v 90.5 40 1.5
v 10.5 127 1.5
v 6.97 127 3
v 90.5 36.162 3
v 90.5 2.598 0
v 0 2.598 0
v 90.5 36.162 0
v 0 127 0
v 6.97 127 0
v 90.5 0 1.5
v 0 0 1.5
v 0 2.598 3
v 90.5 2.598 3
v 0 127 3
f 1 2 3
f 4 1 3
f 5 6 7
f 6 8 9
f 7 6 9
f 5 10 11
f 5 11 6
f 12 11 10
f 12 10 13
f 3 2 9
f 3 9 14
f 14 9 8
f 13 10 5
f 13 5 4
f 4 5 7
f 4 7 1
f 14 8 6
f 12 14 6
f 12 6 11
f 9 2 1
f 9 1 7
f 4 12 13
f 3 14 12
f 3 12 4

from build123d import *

# Parameters (mm, degrees)
BOSS_EXTRUDE1_DEPTH = 3
CHAMFER7_SIZE       = 1.5
CHAMFER7_SIZE_2     = 2.598076211


with BuildPart() as part:
    # Sketch1 → Boss-Extrude1 (new body)
    with BuildSketch(Plane.XY):
        Polygon((90.5, 0), (90.5, 40), (10.5, 127), (0, 127), (0, 0), align=None)
    extrude(amount=BOSS_EXTRUDE1_DEPTH)

    # Chamfer7
    # the kernel refuses this chamfer: 2.598076211, 1.5 mm, written as the material it takes off along each edge
    with BuildSketch(Plane(origin=(-6.721445956, 0, 3), x_dir=(0, -0.0578938624026714, -0.9983227437537926), z_dir=(1, 0, 0))) as chamfer7_piece_1:
        Polygon((CHAMFER7_SIZE * 0.998322743754, CHAMFER7_SIZE * 0.0578938624027), (-CHAMFER7_SIZE_2 * 0.0578938624105, CHAMFER7_SIZE_2 * 0.99832274389), (0, 0), align=None)
    extrude(amount=103.942891912, mode=Mode.SUBTRACT)
    with BuildSketch(Plane(origin=(-6.721445956, 0, 0), x_dir=(0, -0.0578938624026714, 0.9983227437537926), z_dir=(1, 0, 0))) as chamfer7_piece_2:
        Polygon((CHAMFER7_SIZE * 0.998322743754, -CHAMFER7_SIZE * 0.0578938624027), (-CHAMFER7_SIZE_2 * 0.0578938624105, -CHAMFER7_SIZE_2 * 0.99832274389), (0, 0), align=None)
    extrude(amount=103.942891912, mode=Mode.SUBTRACT)
    with BuildSketch(Plane(origin=(95.04956673, 35.052346181, 3), x_dir=(0.042615650155104184, 0.03918680474032571, -0.9983227437537929), z_dir=(-0.6768732144311417, 0.7360996206938663, 0))) as chamfer7_piece_3:
        Polygon((CHAMFER7_SIZE * 0.998322743754, CHAMFER7_SIZE * 0.0578938624027), (-CHAMFER7_SIZE_2 * 0.0578938624105, CHAMFER7_SIZE_2 * 0.99832274389), (0, 0), align=None)
    extrude(amount=131.633416067, mode=Mode.SUBTRACT)
    with BuildSketch(Plane(origin=(95.04956673, 35.052346181, 0), x_dir=(0.042615650155104184, 0.03918680474032571, 0.9983227437537929), z_dir=(-0.6768732144311417, 0.7360996206938663, 0))) as chamfer7_piece_4:
        Polygon((CHAMFER7_SIZE * 0.998322743754, -CHAMFER7_SIZE * 0.0578938624027), (-CHAMFER7_SIZE_2 * 0.0578938624105, -CHAMFER7_SIZE_2 * 0.99832274389), (0, 0), align=None)
    extrude(amount=131.633416067, mode=Mode.SUBTRACT)


solid = part.part
